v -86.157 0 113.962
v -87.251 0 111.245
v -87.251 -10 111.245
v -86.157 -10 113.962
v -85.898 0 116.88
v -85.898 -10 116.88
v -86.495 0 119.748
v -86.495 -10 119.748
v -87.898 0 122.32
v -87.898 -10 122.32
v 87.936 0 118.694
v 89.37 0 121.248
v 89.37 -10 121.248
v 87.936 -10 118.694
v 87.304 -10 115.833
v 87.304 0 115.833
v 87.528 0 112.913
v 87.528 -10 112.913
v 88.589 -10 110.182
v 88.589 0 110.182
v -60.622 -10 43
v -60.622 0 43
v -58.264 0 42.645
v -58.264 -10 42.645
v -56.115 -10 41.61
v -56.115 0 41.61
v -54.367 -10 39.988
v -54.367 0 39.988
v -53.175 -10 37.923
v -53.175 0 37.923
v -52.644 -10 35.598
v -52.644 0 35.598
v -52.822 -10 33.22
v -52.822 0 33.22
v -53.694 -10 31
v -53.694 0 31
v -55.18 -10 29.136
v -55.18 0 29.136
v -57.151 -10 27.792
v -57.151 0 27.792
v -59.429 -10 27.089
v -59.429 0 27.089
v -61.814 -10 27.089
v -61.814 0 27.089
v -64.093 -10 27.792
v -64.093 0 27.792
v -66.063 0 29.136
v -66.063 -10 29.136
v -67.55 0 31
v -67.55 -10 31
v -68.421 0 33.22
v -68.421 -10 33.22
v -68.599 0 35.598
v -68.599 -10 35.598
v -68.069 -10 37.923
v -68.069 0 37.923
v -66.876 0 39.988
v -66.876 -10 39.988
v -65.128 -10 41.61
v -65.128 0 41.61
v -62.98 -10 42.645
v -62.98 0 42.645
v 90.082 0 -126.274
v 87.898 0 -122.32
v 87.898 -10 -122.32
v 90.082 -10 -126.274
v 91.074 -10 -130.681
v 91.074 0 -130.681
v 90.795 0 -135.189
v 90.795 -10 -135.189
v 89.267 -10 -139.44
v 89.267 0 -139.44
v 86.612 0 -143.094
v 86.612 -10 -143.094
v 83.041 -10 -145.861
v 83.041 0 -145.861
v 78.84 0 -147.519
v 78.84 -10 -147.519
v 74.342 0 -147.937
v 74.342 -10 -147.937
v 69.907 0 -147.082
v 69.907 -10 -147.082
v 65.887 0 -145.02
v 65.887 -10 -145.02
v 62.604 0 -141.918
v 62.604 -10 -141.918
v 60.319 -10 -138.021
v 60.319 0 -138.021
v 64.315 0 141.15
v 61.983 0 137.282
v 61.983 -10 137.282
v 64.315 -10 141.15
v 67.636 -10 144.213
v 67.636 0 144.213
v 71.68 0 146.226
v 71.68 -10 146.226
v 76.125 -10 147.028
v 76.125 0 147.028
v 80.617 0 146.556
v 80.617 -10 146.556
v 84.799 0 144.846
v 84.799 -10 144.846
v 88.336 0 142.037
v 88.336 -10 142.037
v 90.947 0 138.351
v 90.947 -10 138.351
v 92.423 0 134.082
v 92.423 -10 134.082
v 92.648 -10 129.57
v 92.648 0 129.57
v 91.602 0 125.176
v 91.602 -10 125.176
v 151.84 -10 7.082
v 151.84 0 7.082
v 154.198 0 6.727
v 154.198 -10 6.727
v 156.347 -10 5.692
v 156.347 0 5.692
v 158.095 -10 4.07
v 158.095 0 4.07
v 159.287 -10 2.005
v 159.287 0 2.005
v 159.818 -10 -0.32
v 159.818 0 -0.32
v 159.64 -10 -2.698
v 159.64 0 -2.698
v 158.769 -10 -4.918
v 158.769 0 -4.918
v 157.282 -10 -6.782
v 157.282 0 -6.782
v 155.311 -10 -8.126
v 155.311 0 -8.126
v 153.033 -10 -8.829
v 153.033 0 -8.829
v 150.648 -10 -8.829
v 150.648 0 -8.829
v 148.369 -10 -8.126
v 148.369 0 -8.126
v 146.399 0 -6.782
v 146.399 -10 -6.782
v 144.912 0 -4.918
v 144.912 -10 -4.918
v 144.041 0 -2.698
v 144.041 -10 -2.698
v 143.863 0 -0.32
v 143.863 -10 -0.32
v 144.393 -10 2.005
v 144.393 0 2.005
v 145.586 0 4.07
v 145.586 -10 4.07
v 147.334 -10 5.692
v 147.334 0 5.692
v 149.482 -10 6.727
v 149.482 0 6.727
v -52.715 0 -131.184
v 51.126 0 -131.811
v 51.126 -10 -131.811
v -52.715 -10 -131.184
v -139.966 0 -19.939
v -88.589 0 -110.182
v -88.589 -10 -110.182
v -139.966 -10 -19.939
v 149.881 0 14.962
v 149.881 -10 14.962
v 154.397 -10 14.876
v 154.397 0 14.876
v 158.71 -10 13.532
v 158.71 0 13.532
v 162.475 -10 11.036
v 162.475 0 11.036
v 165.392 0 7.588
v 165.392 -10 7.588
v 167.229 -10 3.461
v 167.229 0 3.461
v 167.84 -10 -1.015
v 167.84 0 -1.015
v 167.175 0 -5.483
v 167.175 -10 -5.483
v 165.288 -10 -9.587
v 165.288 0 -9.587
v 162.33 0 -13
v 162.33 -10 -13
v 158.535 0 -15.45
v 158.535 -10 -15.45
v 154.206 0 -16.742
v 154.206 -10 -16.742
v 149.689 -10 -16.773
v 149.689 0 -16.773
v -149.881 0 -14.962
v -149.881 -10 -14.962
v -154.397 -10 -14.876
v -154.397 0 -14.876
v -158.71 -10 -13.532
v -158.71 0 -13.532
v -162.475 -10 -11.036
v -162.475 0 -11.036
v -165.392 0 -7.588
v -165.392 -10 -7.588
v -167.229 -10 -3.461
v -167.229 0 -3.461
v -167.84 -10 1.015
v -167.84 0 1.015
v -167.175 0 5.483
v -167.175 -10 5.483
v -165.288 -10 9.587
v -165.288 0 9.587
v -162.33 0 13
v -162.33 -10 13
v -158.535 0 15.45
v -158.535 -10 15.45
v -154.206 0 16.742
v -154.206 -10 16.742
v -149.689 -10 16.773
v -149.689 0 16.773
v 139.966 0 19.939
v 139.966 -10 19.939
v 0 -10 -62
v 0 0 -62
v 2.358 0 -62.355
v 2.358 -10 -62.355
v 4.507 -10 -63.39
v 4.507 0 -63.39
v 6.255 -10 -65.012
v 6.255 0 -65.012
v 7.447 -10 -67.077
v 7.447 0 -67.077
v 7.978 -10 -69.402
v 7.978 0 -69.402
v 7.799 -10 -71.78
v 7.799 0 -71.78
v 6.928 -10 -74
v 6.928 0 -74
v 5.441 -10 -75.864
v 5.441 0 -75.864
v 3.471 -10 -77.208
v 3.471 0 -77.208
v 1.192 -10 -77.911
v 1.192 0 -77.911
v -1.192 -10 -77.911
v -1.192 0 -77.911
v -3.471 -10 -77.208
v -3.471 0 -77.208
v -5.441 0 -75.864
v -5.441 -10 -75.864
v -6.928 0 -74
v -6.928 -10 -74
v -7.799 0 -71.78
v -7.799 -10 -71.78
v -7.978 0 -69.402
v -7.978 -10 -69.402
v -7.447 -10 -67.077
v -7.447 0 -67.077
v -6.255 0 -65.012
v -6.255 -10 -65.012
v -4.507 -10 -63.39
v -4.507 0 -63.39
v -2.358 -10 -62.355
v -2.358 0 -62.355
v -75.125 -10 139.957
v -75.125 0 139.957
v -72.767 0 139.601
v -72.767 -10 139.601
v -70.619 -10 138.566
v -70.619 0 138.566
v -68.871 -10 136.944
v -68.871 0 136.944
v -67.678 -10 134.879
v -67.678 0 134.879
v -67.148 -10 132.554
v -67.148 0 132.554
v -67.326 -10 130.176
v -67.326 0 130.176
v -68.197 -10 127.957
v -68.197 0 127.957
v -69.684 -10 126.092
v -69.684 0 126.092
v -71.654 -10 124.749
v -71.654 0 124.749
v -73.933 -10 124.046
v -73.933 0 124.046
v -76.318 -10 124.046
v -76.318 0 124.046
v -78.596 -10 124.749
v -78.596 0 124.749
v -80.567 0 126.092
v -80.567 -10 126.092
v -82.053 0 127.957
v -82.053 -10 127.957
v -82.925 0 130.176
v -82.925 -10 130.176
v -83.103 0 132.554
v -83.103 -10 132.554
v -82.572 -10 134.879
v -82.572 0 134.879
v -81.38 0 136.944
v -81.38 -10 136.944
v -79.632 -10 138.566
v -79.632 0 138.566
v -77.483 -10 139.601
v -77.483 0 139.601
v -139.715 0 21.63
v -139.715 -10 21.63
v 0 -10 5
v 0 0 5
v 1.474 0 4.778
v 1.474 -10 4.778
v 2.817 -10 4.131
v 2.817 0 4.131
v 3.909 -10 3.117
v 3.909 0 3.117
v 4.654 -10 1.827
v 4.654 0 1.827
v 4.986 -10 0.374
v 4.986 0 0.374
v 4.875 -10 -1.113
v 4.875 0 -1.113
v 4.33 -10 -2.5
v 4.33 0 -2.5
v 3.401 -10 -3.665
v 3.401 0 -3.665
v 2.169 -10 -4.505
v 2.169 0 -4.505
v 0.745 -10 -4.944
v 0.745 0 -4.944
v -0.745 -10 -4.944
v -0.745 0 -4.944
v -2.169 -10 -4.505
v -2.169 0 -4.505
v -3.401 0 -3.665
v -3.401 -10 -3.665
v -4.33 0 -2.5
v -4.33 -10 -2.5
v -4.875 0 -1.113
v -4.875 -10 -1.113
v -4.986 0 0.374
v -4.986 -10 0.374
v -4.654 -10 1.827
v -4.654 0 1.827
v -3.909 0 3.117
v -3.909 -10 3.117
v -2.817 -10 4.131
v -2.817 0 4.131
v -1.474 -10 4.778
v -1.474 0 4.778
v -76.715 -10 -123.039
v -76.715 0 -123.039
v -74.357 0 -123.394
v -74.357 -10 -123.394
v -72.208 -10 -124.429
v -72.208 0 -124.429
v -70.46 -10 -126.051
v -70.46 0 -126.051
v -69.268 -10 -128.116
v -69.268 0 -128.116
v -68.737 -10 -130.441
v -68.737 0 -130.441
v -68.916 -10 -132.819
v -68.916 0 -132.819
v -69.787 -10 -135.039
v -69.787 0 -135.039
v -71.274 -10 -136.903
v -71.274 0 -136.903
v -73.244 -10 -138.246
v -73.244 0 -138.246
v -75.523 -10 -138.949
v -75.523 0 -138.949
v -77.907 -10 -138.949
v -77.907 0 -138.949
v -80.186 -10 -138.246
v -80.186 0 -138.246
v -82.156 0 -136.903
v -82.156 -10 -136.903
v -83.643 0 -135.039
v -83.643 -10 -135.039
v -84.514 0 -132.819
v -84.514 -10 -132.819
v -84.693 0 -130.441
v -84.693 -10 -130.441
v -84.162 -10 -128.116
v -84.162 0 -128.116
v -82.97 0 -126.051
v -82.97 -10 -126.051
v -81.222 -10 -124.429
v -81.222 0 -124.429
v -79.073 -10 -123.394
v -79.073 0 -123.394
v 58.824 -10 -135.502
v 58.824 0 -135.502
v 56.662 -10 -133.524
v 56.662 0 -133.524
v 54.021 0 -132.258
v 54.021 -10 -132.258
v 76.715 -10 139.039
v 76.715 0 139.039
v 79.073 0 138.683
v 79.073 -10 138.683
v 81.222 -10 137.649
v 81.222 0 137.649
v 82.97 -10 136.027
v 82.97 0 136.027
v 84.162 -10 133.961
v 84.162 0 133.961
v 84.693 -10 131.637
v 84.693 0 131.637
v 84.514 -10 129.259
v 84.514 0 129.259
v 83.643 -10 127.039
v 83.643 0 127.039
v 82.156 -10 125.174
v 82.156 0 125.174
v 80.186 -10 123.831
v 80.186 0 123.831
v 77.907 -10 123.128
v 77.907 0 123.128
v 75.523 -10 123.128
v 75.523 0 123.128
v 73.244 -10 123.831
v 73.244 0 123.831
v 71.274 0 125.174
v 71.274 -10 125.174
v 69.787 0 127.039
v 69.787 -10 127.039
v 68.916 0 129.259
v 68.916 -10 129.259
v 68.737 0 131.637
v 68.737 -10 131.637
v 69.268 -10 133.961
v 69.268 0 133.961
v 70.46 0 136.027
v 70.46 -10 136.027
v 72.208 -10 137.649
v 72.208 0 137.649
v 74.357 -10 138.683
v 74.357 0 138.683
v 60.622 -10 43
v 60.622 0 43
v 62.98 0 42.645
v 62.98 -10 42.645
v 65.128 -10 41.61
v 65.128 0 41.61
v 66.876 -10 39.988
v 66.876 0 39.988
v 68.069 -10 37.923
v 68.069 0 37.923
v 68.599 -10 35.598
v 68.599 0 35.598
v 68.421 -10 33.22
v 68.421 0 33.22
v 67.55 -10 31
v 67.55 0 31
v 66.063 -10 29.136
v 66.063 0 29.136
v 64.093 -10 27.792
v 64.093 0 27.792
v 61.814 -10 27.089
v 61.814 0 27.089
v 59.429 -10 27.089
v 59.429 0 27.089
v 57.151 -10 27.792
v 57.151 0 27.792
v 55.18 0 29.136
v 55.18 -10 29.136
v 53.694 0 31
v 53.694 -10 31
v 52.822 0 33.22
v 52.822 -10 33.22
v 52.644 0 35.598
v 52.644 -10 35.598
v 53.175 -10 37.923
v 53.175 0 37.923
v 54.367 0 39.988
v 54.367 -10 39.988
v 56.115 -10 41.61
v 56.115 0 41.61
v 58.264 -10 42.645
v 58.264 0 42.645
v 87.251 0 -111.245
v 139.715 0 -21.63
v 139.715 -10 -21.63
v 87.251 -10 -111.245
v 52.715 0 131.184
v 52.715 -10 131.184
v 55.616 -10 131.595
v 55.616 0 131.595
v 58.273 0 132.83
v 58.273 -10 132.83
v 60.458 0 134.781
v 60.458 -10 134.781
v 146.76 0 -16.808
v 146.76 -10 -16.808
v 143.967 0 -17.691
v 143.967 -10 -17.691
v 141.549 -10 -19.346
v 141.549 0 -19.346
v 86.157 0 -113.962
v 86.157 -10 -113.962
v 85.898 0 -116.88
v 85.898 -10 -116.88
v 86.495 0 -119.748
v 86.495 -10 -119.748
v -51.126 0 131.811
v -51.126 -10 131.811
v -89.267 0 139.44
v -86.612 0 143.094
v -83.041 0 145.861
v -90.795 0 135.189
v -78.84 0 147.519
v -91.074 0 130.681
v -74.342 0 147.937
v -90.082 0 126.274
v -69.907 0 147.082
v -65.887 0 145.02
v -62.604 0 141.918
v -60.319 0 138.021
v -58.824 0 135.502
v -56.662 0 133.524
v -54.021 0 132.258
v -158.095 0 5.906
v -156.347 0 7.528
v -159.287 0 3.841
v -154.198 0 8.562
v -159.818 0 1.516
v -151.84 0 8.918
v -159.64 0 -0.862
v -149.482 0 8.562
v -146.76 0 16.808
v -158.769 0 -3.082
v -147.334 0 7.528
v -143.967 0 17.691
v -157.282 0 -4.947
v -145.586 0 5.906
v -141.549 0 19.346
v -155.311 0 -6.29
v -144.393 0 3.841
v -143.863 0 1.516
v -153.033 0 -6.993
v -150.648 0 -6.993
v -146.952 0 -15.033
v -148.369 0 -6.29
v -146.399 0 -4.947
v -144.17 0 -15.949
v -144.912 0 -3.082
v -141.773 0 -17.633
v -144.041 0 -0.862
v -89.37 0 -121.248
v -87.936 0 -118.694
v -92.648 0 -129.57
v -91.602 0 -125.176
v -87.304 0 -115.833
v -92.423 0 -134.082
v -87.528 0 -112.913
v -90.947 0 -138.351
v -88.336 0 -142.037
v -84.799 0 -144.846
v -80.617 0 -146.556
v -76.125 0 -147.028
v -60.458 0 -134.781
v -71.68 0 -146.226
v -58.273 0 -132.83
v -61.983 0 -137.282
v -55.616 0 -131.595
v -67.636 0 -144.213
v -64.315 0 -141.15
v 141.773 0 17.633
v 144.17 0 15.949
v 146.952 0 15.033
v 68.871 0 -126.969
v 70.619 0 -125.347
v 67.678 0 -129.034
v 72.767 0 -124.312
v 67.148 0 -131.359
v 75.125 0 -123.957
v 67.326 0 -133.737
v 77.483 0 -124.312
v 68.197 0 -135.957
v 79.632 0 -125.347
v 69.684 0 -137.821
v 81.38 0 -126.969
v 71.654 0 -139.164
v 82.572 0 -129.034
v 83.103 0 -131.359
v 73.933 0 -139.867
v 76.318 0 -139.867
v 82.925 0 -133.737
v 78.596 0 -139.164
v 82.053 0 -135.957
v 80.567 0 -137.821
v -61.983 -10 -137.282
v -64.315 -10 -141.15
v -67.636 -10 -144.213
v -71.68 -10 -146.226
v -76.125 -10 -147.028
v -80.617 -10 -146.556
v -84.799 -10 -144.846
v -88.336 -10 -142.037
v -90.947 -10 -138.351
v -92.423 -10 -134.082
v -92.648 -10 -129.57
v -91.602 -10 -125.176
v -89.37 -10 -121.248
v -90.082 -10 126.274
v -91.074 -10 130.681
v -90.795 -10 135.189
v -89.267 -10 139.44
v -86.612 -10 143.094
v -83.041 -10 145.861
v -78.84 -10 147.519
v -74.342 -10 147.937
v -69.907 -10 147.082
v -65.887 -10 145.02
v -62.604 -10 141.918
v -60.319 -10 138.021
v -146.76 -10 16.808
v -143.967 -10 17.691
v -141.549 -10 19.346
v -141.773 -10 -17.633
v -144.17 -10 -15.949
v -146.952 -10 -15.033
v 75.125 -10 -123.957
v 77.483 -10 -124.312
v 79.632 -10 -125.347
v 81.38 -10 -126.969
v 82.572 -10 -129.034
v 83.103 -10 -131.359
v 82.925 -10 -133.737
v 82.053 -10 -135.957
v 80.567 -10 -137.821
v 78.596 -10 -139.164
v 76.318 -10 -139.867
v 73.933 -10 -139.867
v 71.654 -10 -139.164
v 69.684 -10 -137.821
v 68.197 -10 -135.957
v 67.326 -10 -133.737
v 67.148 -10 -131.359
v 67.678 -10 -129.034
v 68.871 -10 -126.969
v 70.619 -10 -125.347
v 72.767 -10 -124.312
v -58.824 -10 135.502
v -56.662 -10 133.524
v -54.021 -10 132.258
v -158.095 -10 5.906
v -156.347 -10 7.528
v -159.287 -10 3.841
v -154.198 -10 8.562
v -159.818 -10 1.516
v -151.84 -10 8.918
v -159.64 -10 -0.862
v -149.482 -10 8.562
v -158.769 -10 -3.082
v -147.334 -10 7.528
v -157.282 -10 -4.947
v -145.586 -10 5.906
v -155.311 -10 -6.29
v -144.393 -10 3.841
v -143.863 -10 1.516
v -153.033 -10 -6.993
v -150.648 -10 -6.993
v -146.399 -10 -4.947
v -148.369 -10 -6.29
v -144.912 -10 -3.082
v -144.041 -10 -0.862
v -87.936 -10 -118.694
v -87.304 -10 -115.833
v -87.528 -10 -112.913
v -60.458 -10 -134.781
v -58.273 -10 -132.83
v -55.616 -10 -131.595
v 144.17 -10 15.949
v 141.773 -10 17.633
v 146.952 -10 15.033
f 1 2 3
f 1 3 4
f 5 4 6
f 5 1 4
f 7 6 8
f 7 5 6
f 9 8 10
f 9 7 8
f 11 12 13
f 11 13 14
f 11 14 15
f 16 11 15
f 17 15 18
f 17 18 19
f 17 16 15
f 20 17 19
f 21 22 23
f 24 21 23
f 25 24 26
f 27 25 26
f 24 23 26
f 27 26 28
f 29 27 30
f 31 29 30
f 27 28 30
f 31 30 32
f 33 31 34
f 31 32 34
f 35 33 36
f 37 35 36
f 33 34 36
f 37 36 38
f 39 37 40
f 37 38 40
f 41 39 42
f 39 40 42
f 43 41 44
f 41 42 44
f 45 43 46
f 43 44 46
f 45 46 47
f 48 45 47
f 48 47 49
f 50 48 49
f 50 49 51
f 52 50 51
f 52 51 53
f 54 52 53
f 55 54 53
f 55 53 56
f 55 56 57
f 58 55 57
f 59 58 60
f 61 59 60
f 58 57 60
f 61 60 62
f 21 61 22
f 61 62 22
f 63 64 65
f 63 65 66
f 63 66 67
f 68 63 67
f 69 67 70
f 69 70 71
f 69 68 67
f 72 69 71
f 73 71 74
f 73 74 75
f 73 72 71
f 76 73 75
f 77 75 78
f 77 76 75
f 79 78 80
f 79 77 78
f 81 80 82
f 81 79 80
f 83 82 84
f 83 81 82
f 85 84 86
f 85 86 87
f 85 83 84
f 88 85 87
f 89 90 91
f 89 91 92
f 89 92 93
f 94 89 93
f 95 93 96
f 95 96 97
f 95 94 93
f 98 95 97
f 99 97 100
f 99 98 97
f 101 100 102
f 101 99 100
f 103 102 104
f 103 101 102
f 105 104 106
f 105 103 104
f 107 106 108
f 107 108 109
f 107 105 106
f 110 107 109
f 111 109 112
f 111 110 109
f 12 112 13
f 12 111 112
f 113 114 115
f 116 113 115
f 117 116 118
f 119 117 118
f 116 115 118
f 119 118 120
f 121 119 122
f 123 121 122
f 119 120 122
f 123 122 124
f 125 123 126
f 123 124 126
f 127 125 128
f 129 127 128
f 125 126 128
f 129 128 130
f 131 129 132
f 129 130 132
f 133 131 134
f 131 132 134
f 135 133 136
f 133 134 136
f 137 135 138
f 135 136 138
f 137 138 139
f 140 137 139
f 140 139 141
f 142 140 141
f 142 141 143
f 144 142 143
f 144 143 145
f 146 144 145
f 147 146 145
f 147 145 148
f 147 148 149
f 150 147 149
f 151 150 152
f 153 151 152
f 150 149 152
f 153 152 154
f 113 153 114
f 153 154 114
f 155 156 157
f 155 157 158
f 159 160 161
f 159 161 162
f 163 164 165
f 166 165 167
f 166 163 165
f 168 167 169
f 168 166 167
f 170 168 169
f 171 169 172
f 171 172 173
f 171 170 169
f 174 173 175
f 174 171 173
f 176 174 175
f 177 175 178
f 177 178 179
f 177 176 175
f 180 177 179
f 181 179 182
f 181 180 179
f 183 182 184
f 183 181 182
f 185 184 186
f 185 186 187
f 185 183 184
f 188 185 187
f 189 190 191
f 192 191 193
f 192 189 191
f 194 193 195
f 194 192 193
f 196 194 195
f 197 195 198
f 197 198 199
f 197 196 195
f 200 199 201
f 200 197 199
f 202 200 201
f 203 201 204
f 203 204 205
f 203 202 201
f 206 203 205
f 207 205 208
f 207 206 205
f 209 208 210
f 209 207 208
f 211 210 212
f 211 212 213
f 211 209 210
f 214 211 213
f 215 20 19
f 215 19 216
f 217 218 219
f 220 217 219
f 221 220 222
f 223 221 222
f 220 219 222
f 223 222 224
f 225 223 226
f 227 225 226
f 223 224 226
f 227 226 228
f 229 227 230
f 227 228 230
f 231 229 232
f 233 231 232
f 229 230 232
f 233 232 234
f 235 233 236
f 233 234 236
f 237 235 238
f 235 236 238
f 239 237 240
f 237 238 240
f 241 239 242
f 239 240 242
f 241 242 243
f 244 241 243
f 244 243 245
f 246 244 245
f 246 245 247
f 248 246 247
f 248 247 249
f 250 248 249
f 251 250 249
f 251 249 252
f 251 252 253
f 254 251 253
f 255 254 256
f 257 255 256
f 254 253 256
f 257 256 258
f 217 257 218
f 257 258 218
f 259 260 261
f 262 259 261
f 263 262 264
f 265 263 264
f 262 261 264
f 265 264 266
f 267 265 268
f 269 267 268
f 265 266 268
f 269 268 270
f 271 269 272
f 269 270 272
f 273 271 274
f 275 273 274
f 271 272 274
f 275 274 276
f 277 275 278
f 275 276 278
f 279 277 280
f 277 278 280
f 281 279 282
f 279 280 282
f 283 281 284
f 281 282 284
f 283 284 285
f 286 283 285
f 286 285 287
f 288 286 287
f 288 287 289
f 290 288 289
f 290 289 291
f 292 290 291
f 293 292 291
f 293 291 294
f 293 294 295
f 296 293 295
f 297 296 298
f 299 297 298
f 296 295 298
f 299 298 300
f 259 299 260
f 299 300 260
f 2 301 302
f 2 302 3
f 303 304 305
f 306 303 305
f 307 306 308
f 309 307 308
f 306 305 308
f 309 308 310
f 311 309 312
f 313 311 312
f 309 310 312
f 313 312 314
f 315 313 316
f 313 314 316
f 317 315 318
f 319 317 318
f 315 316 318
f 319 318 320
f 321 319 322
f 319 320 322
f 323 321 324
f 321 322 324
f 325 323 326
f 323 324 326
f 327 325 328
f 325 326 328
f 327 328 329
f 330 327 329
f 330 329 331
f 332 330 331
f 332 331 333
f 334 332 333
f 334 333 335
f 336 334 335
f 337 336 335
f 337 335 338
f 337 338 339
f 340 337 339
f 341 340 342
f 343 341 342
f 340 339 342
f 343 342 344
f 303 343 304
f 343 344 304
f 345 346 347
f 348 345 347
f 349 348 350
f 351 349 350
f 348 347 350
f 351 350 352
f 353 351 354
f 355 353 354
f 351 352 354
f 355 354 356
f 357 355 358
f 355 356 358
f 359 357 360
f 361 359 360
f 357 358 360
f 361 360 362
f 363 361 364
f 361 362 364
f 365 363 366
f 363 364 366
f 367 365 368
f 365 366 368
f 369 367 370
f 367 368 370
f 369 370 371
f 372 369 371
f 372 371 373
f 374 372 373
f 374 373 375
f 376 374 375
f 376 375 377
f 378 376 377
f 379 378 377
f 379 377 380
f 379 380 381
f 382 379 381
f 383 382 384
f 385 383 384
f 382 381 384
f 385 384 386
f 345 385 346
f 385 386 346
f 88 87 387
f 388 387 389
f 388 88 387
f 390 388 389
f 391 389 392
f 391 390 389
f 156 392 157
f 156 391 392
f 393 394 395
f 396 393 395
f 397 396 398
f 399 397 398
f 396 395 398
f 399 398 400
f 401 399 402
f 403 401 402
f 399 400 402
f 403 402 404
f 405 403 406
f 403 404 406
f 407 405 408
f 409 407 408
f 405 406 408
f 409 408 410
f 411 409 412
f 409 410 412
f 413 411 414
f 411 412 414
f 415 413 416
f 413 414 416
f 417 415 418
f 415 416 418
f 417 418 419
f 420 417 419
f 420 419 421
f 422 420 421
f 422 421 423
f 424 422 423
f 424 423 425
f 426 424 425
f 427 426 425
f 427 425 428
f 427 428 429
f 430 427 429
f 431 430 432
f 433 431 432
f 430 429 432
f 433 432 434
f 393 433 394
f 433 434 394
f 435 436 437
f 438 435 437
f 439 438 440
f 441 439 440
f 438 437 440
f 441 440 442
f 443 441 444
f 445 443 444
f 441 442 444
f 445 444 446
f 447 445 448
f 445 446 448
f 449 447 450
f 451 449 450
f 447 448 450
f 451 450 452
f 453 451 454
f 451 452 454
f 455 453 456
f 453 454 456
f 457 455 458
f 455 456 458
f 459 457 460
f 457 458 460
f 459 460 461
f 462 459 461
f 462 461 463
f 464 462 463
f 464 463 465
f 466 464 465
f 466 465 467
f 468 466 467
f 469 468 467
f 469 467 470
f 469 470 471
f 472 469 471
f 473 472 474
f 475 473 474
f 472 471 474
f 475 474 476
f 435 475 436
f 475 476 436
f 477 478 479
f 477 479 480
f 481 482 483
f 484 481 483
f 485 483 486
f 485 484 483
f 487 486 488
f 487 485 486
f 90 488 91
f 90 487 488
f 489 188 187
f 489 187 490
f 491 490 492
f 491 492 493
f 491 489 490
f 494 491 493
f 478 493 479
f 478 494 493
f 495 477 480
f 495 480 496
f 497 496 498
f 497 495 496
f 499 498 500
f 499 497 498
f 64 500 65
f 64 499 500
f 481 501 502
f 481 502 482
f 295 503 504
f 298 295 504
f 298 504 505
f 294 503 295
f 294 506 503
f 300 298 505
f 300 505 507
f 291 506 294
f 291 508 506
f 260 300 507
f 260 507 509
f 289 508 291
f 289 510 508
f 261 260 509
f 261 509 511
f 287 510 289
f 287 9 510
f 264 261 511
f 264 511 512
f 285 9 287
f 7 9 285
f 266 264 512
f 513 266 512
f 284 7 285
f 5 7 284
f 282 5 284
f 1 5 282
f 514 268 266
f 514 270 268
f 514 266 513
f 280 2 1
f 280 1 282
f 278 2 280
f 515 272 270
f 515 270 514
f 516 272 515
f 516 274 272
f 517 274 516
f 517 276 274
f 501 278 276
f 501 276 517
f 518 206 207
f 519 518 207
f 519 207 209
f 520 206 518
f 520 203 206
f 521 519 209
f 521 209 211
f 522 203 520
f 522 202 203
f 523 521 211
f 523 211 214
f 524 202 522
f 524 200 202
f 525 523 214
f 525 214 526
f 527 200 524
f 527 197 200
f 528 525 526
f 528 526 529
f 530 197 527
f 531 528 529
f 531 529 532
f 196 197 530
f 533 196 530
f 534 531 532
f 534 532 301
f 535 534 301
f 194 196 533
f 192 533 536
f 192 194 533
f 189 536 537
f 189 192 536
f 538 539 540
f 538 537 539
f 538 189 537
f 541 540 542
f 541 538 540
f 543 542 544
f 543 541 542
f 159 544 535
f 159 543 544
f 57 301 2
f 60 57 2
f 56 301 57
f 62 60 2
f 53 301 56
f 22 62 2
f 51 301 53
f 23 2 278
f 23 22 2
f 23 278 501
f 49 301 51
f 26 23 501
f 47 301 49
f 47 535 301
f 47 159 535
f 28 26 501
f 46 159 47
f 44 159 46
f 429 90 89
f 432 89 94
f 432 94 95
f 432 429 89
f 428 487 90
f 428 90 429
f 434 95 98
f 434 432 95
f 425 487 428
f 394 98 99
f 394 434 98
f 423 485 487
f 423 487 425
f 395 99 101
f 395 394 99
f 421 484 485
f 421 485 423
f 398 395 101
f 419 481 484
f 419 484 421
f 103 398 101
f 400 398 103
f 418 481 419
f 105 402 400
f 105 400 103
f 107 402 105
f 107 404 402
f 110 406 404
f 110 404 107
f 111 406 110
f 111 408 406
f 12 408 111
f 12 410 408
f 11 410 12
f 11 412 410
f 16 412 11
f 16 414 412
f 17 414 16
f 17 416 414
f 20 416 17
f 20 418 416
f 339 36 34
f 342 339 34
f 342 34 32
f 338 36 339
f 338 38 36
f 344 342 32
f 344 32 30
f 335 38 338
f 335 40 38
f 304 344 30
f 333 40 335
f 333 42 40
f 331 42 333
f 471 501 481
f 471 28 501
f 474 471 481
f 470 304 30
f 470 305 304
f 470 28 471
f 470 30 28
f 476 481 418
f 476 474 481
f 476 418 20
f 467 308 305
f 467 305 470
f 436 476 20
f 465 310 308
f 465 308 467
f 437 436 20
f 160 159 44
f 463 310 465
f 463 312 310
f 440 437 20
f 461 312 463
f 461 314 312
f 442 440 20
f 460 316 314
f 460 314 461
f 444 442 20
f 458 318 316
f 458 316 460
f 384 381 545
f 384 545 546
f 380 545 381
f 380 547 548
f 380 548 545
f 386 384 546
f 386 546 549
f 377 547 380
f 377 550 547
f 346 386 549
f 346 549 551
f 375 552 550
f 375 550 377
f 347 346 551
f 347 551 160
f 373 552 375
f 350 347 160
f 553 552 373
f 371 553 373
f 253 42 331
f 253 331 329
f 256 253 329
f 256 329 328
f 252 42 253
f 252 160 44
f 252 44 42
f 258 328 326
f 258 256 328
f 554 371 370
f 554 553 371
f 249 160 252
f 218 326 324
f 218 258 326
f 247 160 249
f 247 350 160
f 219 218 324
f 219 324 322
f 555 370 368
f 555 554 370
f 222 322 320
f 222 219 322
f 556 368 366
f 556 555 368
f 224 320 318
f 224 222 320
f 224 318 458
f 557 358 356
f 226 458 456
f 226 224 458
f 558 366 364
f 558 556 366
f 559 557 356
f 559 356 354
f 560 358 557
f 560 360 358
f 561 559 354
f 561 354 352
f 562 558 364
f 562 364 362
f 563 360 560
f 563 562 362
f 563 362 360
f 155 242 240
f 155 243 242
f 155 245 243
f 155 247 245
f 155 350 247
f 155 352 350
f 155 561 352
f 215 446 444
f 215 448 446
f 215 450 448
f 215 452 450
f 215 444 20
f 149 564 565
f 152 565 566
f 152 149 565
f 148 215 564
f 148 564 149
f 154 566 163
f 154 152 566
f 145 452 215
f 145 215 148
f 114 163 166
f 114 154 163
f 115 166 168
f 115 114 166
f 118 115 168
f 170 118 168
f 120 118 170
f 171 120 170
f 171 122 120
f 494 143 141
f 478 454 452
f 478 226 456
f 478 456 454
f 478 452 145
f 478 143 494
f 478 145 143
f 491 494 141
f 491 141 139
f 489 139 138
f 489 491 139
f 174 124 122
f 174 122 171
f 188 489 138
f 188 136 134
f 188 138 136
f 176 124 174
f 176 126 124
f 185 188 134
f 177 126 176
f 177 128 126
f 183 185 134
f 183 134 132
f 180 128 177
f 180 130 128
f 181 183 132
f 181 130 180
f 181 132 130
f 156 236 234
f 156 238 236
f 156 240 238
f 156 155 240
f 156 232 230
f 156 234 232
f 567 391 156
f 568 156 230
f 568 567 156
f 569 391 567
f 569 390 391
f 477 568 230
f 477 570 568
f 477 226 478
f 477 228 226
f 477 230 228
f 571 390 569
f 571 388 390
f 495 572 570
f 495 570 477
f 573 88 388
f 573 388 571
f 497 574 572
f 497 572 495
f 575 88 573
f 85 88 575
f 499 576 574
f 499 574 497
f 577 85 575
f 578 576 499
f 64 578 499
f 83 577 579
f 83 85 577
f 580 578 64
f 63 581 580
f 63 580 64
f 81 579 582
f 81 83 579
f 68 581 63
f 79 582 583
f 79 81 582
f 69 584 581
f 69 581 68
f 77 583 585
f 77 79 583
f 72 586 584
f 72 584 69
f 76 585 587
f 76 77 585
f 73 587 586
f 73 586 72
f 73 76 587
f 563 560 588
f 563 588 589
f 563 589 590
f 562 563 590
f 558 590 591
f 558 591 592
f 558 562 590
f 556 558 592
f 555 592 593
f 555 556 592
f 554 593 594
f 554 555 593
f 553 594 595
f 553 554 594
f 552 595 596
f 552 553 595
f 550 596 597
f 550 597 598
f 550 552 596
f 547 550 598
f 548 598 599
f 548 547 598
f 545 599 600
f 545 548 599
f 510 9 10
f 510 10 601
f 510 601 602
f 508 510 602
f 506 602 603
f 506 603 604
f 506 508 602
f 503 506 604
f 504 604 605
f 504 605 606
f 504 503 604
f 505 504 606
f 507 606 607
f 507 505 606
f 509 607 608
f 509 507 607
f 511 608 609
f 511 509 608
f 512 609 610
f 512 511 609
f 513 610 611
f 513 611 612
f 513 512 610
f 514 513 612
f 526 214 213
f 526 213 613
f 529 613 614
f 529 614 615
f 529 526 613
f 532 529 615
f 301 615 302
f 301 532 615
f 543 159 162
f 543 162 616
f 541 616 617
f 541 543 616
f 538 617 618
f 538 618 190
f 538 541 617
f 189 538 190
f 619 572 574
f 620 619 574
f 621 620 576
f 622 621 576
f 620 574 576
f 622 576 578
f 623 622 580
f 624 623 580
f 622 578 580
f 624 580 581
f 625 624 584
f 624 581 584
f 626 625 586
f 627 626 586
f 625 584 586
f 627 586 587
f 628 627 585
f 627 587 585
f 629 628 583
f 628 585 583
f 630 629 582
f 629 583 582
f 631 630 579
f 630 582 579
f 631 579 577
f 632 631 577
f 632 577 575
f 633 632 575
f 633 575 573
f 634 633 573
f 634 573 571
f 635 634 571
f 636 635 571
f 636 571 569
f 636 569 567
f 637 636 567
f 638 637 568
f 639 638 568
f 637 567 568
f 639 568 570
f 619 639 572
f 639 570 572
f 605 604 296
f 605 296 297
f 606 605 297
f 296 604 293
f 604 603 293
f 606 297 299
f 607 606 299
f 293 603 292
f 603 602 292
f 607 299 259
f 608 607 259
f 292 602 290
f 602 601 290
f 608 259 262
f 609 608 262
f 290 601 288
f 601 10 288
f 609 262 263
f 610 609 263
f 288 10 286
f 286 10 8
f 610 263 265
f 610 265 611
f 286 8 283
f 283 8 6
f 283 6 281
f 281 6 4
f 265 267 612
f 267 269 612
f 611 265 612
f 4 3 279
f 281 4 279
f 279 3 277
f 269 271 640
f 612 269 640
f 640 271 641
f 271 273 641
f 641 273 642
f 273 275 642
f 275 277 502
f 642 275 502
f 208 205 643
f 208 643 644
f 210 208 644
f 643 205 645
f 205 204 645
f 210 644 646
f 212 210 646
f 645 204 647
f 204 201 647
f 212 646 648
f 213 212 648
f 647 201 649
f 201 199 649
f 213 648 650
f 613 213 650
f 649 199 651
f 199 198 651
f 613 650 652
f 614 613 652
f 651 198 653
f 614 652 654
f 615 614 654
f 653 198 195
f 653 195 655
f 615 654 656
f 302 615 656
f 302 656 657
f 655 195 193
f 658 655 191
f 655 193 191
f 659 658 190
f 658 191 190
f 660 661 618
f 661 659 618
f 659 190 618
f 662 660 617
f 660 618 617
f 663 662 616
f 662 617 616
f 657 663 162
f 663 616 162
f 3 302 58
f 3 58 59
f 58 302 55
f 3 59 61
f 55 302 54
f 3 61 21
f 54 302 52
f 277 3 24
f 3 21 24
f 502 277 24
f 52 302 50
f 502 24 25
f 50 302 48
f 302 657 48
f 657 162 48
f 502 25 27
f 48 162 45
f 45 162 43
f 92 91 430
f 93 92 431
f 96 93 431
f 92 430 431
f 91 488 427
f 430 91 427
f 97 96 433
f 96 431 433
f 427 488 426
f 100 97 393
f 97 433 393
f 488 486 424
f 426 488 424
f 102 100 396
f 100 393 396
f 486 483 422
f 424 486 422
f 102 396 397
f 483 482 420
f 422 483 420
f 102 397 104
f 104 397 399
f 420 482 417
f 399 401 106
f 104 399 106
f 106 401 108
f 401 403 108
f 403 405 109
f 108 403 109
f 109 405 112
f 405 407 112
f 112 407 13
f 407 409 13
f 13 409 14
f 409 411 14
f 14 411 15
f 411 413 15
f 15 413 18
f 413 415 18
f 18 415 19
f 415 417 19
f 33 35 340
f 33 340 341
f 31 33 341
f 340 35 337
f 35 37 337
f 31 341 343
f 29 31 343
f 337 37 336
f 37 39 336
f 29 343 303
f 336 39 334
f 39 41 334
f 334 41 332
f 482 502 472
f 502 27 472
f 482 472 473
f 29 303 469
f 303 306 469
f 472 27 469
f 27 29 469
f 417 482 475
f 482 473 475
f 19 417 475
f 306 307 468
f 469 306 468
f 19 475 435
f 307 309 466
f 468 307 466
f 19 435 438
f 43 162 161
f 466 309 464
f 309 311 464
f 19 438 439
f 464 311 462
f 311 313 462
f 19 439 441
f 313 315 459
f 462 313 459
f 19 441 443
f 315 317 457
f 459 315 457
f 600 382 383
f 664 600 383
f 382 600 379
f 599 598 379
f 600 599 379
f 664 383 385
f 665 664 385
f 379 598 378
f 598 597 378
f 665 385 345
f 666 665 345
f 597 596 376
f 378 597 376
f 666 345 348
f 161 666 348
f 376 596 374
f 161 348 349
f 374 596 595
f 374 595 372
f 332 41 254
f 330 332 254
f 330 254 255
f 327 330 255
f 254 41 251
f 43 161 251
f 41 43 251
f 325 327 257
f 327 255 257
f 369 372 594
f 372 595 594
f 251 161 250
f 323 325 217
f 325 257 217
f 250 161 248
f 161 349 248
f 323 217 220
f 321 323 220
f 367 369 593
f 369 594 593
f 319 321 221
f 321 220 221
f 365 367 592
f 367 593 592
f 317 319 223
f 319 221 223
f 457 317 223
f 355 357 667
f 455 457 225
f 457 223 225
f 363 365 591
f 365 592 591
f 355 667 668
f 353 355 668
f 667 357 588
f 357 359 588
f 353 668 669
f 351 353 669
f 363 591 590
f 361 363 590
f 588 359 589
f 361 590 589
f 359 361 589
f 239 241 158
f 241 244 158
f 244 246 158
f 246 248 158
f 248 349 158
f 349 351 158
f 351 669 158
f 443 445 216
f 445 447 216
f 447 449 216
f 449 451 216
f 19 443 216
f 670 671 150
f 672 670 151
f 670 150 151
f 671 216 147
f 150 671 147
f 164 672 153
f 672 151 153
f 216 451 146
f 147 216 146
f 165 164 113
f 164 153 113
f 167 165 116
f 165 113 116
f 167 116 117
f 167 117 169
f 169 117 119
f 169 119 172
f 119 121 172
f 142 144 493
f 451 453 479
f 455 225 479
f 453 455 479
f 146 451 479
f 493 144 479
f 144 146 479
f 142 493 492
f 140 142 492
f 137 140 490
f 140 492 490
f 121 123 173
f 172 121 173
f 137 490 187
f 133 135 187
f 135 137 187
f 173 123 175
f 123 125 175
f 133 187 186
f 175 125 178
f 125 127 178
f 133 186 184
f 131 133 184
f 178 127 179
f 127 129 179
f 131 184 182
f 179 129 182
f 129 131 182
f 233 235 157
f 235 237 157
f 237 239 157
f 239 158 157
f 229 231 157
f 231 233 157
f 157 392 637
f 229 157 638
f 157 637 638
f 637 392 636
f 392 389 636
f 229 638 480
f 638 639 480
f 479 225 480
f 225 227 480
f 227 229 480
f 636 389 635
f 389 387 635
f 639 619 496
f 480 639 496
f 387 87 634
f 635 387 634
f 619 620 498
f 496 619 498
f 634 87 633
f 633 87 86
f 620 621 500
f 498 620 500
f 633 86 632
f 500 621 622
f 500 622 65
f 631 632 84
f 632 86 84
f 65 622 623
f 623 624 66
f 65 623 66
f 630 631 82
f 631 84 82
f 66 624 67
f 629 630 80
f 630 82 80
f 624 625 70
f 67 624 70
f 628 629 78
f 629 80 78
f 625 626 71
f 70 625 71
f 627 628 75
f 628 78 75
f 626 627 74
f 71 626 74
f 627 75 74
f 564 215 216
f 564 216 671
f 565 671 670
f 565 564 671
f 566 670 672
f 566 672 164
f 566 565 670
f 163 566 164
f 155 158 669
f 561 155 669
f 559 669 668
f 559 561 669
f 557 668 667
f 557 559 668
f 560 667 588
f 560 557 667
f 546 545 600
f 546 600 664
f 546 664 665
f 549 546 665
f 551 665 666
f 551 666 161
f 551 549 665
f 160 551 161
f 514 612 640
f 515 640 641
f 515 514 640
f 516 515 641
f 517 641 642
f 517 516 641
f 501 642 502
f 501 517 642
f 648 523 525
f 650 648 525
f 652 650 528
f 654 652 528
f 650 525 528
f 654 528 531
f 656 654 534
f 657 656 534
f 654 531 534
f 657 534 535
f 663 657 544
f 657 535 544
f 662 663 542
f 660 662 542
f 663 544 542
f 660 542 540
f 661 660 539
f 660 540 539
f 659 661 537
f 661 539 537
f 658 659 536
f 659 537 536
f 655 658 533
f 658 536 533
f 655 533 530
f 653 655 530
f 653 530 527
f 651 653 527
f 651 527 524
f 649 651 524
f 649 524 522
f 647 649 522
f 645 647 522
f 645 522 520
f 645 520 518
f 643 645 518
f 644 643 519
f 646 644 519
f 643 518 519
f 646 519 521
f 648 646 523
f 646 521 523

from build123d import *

# Parameters (mm, degrees)
ESQUISSE1_R        = 8
ESQUISSE1_R_2      = 5
BOSS_EXTRU_2_DEPTH = 10


with BuildPart() as part:
    # Esquisse1 → Boss.-Extru.2 (new body)
    with BuildSketch(Plane(origin=(0, 0, 0), x_dir=(1, 0, 0), z_dir=(0, 1, 0))):
        with BuildLine():
            Line((88.589203043, -110.181902046), (139.966204056, -19.938910608))
            ThreePointArc((139.966204056, -19.938910608), (144.170152865, -15.949329734), (149.881071002, -14.961729023))
            ThreePointArc((149.881071002, -14.961729023), (167.84005434, 1.014572883), (149.689240839, 16.772595422))
            ThreePointArc((149.689240839, 16.772595422), (143.966800629, 17.691082861), (139.71492773, 21.629549313))
            Line((139.71492773, 21.629549313), (87.250705139, 111.24483308))
            ThreePointArc((87.250705139, 111.24483308), (85.897601156, 116.880349981), (87.897772919, 122.319950523))
            ThreePointArc((87.897772919, 122.319950523), (83.04138128, 145.861037272), (60.319126696, 138.02098295))
            ThreePointArc((60.319126696, 138.02098295), (56.662473136, 133.524448077), (51.125724688, 131.811451359))
            Line((51.125724688, 131.811451359), (-52.715498918, 131.183743688))
            ThreePointArc((-52.715498918, 131.183743688), (-58.272551709, 132.829679716), (-61.983298082, 137.281679546))
            ThreePointArc((-61.983298082, 137.281679546), (-84.79867306, 144.846464389), (-89.370114142, 121.248387528))
            ThreePointArc((-89.370114142, 121.248387528), (-87.304327493, 115.833365215), (-88.589203043, 110.181902046))
            Line((-88.589203043, 110.181902046), (-139.966204056, 19.938910608))
            ThreePointArc((-139.966204056, 19.938910608), (-144.170152865, 15.949329734), (-149.881071002, 14.961729023))
            ThreePointArc((-149.881071002, 14.961729023), (-167.84005434, -1.014572883), (-149.689240839, -16.772595422))
            ThreePointArc((-149.689240839, -16.772595422), (-143.966800629, -17.691082861), (-139.71492773, -21.629549313))
            Line((-139.71492773, -21.629549313), (-87.250705139, -111.24483308))
            ThreePointArc((-87.250705139, -111.24483308), (-85.897601156, -116.880349981), (-87.897772919, -122.319950523))
            ThreePointArc((-87.897772919, -122.319950523), (-83.04138128, -145.861037272), (-60.319126696, -138.02098295))
            ThreePointArc((-60.319126696, -138.02098295), (-56.662473136, -133.524448077), (-51.125724688, -131.811451359))
            Line((-51.125724688, -131.811451359), (52.715498918, -131.183743688))
            ThreePointArc((52.715498918, -131.183743688), (58.272551709, -132.829679716), (61.983298082, -137.281679546))
            ThreePointArc((61.983298082, -137.281679546), (84.79867306, -144.846464389), (89.370114142, -121.248387528))
            ThreePointArc((89.370114142, -121.248387528), (87.304327493, -115.833365215), (88.589203043, -110.181902046))
        make_face()
        with Locations(Location((-151.840346656, -0.91785658, 0), (0, 0, 270))):  # turned: the seam where the file's is
            Circle(ESQUISSE1_R, mode=Mode.SUBTRACT)
        with Locations(Location((-76.715060443, 131.038669234, 0), (0, 0, 270))):  # turned: the seam where the file's is
            Circle(ESQUISSE1_R, mode=Mode.SUBTRACT)
        with Locations(Location((75.125286213, 131.956525813, 0), (0, 0, 270))):  # turned: the seam where the file's is
            Circle(ESQUISSE1_R, mode=Mode.SUBTRACT)
        with Locations(Location((151.840346656, 0.91785658, 0), (0, 0, 270))):  # turned: the seam where the file's is
            Circle(ESQUISSE1_R, mode=Mode.SUBTRACT)
        with Locations(Location((76.715060443, -131.038669234, 0), (0, 0, 270))):  # turned: the seam where the file's is
            Circle(ESQUISSE1_R, mode=Mode.SUBTRACT)
        with Locations(Location((-75.125286213, -131.956525813, 0), (0, 0, 270))):  # turned: the seam where the file's is
            Circle(ESQUISSE1_R, mode=Mode.SUBTRACT)
        with Locations(Location((0, 70, 0), (0, 0, 270))):  # turned: the seam where the file's is
            Circle(ESQUISSE1_R, mode=Mode.SUBTRACT)
        with Locations(Location((60.621778265, -35, 0), (0, 0, 270))):  # turned: the seam where the file's is
            Circle(ESQUISSE1_R, mode=Mode.SUBTRACT)
        with Locations(Location((-60.621778265, -35, 0), (0, 0, 270))):  # turned: the seam where the file's is
            Circle(ESQUISSE1_R, mode=Mode.SUBTRACT)
        with Locations(Location((0, 0, 0), (0, 0, 270))):  # turned: the seam where the file's is
            Circle(ESQUISSE1_R_2, mode=Mode.SUBTRACT)
    extrude(amount=-BOSS_EXTRU_2_DEPTH)


solid = part.part
